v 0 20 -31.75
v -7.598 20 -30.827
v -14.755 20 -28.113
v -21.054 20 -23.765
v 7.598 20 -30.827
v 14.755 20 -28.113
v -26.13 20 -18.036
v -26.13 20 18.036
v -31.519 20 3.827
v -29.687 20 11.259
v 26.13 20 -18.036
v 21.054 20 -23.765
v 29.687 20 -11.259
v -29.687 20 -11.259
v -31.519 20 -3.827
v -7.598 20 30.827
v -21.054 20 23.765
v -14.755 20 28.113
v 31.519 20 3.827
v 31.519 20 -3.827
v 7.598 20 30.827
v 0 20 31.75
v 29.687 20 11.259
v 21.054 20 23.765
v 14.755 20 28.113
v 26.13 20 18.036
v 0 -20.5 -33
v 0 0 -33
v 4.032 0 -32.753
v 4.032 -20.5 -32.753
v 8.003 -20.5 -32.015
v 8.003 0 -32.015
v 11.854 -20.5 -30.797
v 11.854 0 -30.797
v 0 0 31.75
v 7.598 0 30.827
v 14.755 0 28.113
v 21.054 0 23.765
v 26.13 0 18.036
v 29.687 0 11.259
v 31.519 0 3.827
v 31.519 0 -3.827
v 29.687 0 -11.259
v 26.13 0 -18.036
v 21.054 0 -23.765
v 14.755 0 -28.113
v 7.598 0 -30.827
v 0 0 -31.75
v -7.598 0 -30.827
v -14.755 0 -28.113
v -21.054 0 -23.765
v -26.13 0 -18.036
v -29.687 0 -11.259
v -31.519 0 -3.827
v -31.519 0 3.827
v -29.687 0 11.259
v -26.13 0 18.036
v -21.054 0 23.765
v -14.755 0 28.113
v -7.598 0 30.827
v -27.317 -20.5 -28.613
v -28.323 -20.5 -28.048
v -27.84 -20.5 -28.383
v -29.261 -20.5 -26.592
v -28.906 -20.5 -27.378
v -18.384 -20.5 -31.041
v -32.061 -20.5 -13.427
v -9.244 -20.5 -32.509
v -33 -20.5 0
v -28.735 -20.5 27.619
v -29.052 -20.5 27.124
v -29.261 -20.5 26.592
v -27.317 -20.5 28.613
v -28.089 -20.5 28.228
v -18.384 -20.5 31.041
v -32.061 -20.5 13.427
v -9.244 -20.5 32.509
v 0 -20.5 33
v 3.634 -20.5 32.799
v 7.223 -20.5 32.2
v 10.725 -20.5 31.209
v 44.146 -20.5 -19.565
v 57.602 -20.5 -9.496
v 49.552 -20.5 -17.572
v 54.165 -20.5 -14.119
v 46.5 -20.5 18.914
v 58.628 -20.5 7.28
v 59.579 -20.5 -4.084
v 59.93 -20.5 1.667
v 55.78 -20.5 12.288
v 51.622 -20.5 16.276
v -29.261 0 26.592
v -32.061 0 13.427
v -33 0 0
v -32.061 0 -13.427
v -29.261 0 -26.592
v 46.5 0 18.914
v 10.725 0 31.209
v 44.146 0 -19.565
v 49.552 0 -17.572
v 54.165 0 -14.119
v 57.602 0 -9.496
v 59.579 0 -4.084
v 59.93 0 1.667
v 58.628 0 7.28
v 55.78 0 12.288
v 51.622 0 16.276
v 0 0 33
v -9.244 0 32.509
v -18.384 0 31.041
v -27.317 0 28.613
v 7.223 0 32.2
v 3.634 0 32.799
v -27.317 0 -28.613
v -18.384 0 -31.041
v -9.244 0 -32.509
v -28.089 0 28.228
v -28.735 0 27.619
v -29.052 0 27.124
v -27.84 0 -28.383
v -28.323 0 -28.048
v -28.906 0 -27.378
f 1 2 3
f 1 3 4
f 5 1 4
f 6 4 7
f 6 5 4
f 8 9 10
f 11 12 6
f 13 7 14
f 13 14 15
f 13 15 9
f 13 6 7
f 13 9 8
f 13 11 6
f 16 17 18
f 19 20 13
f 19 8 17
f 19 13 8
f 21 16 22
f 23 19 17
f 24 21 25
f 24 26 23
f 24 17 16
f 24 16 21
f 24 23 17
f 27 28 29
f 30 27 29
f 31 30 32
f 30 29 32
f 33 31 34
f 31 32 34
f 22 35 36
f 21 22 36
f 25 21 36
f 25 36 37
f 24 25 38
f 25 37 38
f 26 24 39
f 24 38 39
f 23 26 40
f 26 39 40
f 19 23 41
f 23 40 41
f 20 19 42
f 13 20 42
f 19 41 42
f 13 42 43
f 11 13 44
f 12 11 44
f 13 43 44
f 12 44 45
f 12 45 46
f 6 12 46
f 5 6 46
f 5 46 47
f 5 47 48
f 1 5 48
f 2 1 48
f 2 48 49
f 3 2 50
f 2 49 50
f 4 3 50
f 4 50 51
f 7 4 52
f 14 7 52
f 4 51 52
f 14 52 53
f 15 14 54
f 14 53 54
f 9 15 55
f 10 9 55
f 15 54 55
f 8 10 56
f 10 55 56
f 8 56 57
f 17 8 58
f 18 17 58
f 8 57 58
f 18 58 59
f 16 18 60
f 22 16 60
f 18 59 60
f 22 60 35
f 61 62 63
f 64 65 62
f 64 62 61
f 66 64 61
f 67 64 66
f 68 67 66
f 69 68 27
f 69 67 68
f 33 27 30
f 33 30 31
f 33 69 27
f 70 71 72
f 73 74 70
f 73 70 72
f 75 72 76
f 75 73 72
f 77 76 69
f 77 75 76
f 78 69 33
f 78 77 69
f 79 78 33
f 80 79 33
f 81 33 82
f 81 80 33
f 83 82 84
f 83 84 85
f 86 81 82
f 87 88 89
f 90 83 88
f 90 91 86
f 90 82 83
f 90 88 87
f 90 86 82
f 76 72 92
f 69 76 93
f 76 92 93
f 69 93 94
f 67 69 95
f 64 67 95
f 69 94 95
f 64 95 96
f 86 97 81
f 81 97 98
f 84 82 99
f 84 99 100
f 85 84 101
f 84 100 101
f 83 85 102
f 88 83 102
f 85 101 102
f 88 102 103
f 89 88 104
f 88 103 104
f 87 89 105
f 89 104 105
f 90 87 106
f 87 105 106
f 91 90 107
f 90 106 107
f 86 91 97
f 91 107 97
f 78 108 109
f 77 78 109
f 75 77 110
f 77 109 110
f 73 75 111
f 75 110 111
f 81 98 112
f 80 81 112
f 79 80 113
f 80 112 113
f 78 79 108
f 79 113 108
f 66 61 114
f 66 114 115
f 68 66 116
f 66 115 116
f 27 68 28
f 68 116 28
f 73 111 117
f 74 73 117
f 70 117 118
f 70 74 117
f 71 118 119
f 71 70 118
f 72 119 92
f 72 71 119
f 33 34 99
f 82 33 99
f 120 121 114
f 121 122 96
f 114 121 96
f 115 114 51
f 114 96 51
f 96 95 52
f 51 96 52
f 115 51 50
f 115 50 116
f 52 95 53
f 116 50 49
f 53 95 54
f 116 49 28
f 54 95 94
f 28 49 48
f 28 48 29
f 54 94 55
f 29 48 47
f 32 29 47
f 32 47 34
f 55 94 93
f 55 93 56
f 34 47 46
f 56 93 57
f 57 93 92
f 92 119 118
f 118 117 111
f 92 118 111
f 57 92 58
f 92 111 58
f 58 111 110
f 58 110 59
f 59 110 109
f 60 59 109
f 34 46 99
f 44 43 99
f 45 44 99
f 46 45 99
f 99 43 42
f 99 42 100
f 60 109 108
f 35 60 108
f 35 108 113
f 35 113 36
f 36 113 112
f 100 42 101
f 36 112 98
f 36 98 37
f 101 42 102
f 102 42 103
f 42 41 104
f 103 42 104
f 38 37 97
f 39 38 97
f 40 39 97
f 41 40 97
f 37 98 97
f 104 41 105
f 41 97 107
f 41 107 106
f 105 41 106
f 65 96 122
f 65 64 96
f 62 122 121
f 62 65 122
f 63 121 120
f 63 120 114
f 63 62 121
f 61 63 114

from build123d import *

# Parameters (mm, degrees)
SKETCH_1_R      = 31.75
EXTRUDE_2_DEPTH = 20
EXTRUDE_5_DEPTH = 20.5
FILLET_1_R      = 3


with BuildPart() as part:
    # 草图1 → 凸台-拉伸2 (new body)
    with BuildSketch(Plane(origin=(0, 0, 0), x_dir=(1, 0, 0), z_dir=(0, 1, 0))):
        with Locations(Location((0, 0, 0), (0, 0, 270))):
            Circle(SKETCH_1_R)
    extrude(amount=EXTRUDE_2_DEPTH)

    # 草图3 → 凸台-拉伸5 (add)
    with BuildSketch(Plane.XZ):
        with BuildLine():
            Line((46.5, 18.914280319), (10.725, 31.208562527))
            ThreePointArc((10.725, 31.208562527), (5.436793017, 32.549059613), (0, 33))
            ThreePointArc((0, 33), (-14.61315827, 31.767511075), (-28.813455811, 28.1048654))
            ThreePointArc((-28.813455811, 28.1048654), (-33, 0), (-28.813455811, -28.1048654))
            ThreePointArc((-28.813455811, -28.1048654), (-14.61315827, -31.767511075), (0, -33))
            ThreePointArc((0, -33), (6.028677808, -32.444645843), (11.854443416, -30.797275387))
            Line((11.854443416, -30.797275387), (44.146384059, -19.565467008))
            ThreePointArc((44.146384059, -19.565467008), (59.962693004, -1.221019257), (46.5, 18.914280319))
        make_face()
    extrude(amount=EXTRUDE_5_DEPTH)

    # 圆角1
    fillet_1_edges = [part.edges().sort_by_distance(p)[0] for p in [
        (-28.813455811, -10.25, 28.1048654),
        (-28.813455811, -10.25, -28.1048654),
    ]]
    fillet(fillet_1_edges, radius=FILLET_1_R)


solid = part.part
